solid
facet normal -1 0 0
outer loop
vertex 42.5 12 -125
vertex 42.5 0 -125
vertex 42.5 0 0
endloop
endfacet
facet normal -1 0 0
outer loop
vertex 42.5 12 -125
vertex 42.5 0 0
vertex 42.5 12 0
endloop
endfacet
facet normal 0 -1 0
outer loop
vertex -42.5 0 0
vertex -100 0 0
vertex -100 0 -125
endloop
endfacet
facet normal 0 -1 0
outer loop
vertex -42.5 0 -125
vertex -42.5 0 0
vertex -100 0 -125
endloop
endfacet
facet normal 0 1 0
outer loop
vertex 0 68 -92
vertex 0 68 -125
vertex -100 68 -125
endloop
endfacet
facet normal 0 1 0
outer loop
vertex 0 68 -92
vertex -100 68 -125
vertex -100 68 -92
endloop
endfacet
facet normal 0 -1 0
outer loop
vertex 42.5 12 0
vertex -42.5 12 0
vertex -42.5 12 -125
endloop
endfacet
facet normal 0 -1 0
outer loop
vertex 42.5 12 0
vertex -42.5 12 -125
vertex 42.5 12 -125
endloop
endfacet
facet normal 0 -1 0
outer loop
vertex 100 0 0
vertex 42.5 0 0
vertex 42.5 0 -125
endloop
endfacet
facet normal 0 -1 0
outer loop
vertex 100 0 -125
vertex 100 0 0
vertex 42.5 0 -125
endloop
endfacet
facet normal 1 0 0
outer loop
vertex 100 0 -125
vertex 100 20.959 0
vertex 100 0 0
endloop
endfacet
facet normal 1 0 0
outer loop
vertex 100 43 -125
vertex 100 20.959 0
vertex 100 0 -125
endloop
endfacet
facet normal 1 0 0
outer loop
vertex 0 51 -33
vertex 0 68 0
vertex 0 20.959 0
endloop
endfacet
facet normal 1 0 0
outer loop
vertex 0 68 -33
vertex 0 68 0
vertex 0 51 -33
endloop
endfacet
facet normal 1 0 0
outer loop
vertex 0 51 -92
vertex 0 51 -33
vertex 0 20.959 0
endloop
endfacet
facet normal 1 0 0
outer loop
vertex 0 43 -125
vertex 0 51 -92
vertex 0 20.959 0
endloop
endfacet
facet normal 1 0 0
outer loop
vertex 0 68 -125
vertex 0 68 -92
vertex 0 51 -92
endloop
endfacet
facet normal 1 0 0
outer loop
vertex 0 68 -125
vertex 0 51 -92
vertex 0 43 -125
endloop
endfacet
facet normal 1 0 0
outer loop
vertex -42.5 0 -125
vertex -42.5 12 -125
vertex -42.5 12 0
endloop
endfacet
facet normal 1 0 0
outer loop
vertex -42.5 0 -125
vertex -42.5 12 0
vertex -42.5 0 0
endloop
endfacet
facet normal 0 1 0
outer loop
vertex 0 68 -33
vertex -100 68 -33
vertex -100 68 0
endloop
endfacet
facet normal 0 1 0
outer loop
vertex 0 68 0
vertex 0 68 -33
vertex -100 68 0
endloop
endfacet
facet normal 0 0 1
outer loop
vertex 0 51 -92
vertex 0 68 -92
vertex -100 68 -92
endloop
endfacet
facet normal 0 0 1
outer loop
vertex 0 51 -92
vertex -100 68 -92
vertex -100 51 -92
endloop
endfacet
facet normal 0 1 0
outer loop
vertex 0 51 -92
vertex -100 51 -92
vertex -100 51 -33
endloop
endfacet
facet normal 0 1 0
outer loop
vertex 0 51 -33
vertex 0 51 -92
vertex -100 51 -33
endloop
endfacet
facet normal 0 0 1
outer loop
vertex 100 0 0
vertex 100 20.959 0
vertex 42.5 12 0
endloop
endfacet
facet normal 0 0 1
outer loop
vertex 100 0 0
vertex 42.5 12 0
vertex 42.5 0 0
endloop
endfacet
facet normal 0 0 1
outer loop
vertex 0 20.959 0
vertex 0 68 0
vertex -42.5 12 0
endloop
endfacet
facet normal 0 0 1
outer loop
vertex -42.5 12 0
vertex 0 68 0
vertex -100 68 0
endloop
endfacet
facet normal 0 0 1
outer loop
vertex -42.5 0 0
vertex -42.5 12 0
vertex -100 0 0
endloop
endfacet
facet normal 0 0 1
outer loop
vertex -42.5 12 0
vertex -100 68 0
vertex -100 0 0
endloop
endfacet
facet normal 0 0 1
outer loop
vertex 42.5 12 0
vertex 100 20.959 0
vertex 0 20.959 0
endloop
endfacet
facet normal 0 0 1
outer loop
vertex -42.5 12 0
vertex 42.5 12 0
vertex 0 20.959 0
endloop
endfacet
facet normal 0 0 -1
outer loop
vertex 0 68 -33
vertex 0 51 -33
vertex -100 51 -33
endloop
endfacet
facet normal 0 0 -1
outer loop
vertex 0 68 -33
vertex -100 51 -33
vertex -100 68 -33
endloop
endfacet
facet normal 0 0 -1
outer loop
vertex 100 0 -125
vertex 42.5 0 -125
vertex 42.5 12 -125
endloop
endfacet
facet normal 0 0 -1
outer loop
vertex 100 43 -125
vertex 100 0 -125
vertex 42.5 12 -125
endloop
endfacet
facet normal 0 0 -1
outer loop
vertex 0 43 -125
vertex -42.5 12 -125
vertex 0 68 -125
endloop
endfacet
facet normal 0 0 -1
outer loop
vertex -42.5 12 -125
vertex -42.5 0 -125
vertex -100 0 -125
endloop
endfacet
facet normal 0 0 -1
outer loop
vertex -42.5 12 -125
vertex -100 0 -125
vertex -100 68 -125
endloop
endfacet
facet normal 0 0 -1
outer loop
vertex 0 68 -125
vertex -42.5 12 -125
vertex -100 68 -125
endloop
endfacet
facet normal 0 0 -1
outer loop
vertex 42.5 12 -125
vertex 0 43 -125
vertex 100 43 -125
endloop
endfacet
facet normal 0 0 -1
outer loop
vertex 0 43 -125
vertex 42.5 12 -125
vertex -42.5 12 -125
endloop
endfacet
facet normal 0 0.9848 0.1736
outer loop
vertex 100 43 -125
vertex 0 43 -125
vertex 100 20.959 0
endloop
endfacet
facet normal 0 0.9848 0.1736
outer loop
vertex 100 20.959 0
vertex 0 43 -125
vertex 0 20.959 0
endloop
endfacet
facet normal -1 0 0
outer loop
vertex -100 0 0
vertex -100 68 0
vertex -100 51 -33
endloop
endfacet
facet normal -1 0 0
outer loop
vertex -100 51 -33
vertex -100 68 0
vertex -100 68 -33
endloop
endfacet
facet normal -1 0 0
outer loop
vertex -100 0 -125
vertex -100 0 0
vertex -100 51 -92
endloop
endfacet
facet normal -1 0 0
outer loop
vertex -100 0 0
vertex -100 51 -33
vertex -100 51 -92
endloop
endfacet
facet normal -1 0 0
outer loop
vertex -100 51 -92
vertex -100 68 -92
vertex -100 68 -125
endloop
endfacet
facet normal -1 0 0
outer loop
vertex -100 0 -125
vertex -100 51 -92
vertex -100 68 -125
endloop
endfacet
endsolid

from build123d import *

# Parameters (mm, degrees)
BOSS_EXTRUDE3_DEPTH     = 100
BOSS_EXTRUDE4_DEPTH     = 100
CUT_EXTRUDE1_DEPTH      = 174.922396488
CUT_EXTRUDE1_DEPTH_BACK = 125


with BuildPart() as part:
    # Sketch3 → Boss-Extrude3 (new body)
    with BuildSketch(Plane(origin=(0, 0, 0), x_dir=(0, 0, -1), z_dir=(1, 0, 0))):
        Polygon((33, 68), (0, 68), (0, 0), (125, 0), (125, 68), (92, 68), (92, 51), (33, 51), align=None)
    extrude(amount=-BOSS_EXTRUDE3_DEPTH)

    # Sketch3<3> → Boss-Extrude4 (add)
    with BuildSketch(Plane(origin=(0, 0, 0), x_dir=(0, 0, -1), z_dir=(1, 0, 0))):
        Polygon((125, 43), (0, 20.959127411), (0, 0), (125, 0), align=None)
    extrude(amount=BOSS_EXTRUDE4_DEPTH)

    # Sketch4 → Cut-Extrude1 (cut, two sides: drawn at the far end of the back side and taken through both)
    with BuildSketch(Plane.XY.offset(-CUT_EXTRUDE1_DEPTH_BACK)):
        Polygon((-42.5, -325.78632016), (-42.5, 0), (-42.5, 12), (42.5, 12), (42.5, 0), (42.5, -325.78632016), (42.5, -977.358960479), (-42.5, -977.358960479), align=None)
    extrude(amount=CUT_EXTRUDE1_DEPTH + CUT_EXTRUDE1_DEPTH_BACK, mode=Mode.SUBTRACT)


solid = part.part
